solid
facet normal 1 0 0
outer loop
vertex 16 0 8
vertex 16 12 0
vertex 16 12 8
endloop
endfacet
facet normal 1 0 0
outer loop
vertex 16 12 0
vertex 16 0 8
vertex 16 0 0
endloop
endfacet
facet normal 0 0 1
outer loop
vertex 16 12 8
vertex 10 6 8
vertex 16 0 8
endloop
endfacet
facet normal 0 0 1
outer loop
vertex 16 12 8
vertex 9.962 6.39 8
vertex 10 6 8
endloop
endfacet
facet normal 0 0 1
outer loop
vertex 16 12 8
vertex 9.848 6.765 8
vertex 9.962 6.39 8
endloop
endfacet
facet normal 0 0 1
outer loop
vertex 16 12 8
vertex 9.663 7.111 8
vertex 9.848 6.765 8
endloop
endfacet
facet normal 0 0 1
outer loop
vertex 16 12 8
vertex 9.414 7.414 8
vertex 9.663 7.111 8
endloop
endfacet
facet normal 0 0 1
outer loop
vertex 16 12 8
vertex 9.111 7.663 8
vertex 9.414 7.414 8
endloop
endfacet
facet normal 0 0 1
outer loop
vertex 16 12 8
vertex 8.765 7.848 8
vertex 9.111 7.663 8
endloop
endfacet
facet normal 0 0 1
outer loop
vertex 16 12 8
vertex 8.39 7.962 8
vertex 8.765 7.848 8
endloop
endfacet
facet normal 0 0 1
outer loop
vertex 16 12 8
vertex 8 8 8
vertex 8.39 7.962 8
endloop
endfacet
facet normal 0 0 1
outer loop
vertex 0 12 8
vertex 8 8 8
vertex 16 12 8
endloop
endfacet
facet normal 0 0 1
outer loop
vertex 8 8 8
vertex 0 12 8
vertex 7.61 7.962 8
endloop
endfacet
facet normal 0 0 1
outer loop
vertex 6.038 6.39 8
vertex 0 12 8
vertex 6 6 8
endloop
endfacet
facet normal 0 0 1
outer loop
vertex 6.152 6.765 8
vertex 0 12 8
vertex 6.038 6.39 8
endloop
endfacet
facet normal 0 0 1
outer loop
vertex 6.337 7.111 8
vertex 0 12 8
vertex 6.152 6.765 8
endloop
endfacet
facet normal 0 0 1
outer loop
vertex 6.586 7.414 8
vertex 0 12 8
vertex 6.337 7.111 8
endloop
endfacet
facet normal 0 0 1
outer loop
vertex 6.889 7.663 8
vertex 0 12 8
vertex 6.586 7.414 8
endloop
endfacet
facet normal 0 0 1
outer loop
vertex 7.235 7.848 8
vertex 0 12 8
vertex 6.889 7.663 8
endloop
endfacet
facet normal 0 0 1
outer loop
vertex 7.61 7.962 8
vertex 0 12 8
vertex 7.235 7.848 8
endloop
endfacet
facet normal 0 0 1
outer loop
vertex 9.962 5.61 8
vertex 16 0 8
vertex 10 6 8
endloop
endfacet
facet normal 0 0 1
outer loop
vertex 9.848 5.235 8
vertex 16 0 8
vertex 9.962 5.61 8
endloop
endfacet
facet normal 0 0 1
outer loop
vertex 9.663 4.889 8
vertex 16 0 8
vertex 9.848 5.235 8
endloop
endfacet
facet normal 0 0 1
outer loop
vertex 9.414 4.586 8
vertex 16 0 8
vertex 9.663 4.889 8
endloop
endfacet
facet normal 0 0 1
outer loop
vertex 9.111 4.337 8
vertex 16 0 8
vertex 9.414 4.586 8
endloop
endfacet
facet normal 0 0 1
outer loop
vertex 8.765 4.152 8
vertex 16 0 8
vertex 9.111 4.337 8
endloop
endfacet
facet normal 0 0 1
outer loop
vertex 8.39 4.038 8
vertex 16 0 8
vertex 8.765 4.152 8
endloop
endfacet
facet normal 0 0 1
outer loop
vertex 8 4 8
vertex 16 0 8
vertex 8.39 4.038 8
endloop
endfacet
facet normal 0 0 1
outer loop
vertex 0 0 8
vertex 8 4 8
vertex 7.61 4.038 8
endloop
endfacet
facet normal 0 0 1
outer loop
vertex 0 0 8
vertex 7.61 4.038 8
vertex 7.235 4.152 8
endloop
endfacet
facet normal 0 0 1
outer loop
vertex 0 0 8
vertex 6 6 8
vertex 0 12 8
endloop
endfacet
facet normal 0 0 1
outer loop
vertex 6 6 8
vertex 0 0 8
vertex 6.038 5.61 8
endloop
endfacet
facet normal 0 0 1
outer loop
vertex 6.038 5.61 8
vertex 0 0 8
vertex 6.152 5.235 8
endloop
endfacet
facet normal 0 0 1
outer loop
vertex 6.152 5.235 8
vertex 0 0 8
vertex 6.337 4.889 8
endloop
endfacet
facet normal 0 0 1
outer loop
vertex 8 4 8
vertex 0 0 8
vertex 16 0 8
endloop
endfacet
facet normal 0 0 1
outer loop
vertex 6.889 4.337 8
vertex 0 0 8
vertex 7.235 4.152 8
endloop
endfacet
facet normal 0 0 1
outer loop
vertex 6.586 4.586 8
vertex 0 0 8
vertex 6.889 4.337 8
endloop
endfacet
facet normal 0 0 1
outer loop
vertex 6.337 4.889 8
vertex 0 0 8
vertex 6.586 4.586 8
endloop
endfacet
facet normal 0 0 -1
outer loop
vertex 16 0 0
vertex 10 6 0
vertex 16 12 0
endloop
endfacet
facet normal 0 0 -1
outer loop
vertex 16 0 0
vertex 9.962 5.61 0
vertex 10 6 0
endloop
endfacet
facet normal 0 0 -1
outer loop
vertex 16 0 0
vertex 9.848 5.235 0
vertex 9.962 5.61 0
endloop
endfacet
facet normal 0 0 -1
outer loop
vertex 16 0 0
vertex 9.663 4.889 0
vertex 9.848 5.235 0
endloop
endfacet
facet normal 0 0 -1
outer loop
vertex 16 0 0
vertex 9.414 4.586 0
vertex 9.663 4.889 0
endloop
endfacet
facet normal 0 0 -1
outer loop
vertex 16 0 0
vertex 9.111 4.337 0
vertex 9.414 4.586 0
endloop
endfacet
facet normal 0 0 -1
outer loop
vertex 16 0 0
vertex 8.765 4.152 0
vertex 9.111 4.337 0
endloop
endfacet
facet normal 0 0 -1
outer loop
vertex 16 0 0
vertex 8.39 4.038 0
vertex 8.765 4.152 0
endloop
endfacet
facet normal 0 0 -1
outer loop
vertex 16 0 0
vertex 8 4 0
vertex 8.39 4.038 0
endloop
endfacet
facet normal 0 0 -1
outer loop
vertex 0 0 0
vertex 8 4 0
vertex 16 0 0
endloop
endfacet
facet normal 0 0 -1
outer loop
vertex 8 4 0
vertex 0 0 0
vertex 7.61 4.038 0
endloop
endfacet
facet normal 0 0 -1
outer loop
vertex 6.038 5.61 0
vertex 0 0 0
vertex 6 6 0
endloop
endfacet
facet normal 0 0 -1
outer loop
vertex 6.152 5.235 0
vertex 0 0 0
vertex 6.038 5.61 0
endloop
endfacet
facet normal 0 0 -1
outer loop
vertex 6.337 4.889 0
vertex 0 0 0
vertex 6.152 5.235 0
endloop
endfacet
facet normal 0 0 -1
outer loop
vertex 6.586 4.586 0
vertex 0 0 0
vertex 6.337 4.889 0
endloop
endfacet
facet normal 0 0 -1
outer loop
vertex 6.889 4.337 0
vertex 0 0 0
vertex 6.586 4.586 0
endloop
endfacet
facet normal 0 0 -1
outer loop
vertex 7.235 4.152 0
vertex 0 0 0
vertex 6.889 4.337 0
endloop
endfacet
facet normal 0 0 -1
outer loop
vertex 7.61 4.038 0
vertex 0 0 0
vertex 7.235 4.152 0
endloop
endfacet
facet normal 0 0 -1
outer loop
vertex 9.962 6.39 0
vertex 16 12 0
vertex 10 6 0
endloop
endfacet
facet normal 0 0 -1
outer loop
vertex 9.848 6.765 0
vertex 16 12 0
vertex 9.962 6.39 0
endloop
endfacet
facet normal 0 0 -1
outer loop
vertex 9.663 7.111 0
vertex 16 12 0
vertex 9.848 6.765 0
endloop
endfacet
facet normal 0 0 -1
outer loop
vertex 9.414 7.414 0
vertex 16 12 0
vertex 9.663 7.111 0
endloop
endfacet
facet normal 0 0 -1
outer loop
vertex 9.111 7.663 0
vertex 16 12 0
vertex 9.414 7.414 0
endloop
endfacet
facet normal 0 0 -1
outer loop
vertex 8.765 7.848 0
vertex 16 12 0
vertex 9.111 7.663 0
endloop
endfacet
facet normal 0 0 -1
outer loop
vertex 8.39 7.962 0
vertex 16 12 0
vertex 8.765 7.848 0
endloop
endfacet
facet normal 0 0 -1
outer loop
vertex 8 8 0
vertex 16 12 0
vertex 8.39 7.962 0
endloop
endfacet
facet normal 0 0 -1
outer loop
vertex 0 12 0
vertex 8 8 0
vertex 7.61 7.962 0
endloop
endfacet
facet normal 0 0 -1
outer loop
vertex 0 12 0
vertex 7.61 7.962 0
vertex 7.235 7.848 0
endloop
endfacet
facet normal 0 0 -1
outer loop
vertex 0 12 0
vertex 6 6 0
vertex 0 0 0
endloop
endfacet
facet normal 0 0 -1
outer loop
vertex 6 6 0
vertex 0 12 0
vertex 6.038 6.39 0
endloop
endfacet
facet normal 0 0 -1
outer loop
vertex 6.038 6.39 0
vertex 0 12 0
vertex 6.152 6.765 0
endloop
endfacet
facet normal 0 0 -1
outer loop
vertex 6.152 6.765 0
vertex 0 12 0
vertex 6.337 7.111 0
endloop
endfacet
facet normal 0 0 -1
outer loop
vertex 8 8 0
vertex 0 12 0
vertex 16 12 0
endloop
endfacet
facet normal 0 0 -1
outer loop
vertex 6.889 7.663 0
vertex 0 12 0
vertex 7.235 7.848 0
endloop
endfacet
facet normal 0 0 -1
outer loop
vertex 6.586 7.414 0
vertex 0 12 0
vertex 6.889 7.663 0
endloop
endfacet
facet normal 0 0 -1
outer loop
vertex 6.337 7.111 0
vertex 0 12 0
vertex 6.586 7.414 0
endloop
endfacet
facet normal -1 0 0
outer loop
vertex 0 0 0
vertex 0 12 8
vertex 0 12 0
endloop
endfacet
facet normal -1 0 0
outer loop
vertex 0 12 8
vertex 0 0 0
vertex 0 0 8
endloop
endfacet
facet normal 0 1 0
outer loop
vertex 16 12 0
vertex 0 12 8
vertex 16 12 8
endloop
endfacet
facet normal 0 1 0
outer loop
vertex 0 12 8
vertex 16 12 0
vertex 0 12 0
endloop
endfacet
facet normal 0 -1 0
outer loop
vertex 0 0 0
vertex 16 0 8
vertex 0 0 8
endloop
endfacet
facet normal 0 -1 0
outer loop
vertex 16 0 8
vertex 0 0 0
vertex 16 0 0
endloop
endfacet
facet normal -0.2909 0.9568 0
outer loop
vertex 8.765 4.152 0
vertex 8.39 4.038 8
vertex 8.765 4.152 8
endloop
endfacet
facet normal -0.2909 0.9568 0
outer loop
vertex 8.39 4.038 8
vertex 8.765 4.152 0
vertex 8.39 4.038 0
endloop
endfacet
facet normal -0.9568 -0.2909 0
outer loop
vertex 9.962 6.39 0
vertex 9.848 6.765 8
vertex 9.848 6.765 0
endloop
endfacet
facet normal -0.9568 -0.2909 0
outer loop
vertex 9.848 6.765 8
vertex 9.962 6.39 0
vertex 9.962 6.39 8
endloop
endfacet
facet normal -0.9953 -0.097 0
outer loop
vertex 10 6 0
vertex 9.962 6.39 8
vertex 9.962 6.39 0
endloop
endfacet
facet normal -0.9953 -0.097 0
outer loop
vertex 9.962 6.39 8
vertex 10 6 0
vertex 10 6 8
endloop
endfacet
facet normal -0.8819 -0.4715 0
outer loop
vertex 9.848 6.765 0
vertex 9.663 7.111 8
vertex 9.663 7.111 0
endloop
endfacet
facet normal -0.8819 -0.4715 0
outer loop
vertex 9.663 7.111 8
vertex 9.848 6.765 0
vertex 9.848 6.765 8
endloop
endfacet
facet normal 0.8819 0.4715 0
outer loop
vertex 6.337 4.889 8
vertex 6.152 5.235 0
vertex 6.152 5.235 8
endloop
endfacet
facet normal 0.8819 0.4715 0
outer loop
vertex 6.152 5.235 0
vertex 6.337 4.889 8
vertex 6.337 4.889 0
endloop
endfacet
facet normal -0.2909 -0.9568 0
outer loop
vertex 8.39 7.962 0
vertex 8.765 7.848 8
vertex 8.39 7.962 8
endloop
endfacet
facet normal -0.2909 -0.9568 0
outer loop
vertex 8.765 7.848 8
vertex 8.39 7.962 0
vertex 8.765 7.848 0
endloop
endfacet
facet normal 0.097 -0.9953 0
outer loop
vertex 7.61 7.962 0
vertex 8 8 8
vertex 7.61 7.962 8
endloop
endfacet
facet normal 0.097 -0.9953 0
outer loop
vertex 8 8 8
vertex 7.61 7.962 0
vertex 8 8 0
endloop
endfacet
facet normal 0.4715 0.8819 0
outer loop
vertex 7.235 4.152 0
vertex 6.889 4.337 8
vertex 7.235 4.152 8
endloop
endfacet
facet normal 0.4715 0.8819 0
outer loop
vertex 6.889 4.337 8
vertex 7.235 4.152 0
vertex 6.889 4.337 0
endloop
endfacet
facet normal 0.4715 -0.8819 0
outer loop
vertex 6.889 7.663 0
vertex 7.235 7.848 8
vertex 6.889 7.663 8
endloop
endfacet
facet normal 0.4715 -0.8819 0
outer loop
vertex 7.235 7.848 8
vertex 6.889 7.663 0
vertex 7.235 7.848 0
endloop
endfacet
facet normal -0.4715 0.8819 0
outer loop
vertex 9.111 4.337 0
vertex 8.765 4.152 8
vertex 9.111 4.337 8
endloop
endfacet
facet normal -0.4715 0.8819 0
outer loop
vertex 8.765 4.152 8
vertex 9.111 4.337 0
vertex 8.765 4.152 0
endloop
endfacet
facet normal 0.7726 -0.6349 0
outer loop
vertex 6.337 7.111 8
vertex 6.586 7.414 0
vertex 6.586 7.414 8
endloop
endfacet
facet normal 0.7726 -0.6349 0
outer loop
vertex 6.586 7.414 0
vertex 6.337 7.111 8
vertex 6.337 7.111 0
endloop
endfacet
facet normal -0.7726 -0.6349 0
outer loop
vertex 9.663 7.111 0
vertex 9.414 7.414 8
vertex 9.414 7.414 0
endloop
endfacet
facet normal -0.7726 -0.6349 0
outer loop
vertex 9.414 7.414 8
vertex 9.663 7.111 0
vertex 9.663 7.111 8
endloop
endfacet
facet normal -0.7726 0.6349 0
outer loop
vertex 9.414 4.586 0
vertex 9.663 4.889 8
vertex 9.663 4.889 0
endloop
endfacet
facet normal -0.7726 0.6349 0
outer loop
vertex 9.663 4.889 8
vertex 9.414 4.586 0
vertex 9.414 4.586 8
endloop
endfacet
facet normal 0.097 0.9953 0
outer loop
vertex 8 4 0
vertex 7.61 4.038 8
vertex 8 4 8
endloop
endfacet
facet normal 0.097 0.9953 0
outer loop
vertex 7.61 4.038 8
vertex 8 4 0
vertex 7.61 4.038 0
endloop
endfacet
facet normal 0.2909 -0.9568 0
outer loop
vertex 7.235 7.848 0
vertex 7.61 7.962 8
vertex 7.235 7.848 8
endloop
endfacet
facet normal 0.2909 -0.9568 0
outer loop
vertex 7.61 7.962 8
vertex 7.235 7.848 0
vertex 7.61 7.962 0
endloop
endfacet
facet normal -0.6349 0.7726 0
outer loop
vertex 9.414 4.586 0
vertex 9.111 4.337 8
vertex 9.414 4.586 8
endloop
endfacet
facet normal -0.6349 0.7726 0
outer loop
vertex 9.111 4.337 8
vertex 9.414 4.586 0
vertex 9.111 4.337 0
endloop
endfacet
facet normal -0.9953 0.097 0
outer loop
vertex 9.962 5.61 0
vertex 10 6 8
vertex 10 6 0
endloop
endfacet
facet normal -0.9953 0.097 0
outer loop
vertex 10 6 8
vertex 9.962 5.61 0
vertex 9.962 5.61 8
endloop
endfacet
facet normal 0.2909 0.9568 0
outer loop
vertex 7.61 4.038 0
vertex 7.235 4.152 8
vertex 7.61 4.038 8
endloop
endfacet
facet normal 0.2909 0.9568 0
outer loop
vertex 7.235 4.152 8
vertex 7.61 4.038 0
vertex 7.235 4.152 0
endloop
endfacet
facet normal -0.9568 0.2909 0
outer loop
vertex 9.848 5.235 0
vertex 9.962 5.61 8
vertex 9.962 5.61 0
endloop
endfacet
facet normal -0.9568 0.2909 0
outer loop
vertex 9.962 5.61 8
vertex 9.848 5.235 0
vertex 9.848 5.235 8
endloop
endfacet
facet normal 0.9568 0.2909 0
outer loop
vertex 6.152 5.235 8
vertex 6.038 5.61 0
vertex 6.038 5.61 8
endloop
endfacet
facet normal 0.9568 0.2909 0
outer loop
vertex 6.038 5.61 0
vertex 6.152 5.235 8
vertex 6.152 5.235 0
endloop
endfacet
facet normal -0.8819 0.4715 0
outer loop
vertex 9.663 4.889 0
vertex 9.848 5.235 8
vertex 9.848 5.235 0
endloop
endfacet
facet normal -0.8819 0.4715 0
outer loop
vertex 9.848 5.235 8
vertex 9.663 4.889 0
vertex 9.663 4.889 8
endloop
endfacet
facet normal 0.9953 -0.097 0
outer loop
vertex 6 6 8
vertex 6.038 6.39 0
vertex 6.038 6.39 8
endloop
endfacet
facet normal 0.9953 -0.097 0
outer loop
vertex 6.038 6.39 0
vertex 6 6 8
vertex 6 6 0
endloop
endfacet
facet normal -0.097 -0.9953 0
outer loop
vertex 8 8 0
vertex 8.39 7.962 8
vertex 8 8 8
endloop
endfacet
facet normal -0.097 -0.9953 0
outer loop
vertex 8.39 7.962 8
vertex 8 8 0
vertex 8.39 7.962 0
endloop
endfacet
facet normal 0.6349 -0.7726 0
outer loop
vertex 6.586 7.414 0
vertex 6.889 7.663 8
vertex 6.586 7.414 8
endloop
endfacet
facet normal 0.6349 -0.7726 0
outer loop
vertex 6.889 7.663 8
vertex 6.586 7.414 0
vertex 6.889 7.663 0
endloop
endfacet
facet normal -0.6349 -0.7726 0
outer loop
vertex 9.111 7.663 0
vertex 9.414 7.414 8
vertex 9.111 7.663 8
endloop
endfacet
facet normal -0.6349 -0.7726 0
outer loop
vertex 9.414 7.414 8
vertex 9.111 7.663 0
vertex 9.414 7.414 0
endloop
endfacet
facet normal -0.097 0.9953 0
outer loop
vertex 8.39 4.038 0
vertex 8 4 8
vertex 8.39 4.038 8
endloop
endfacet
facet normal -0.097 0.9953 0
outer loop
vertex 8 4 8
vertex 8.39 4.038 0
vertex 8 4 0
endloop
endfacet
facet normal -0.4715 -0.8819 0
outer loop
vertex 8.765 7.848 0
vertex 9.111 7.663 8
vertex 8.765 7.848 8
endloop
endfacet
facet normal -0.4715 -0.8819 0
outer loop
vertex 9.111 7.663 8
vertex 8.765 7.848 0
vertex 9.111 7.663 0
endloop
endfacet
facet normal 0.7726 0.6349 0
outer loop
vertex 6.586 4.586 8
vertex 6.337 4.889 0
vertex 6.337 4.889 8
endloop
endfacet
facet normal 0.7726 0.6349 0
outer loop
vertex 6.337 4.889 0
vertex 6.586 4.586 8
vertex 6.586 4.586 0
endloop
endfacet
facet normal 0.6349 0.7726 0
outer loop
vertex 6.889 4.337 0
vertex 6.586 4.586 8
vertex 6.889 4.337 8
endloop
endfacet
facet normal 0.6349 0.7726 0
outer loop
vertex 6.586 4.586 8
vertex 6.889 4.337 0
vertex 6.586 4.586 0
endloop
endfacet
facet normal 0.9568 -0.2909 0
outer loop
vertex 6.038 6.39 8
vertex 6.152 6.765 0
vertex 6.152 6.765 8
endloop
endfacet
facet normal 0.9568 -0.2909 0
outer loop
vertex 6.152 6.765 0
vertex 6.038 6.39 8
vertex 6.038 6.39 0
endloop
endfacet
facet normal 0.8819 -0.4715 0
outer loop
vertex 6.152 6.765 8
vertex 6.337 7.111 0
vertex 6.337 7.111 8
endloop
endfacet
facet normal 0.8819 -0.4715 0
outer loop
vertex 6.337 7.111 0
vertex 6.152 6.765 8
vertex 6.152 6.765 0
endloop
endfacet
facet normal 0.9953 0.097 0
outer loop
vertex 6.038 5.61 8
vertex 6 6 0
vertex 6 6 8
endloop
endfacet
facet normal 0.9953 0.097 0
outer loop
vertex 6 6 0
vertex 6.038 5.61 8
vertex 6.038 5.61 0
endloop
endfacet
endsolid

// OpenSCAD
$fn = 32;

// ----------------------------------------------------------------------
// Micro pad: drilled pad, 5-20 mm class
// ----------------------------------------------------------------------

// --- parameters (mm) ---
pad_l = 16;               // pad length, X
pad_w = 12;               // pad width, Y
pad_t = 8;                // pad thickness, Z
hole_d = 4;               // through hole diameter

difference() {
  cube([pad_l, pad_w, pad_t]);
  translate([pad_l / 2, pad_w / 2, -1])
    cylinder(h = pad_t + 2, d = hole_d);
}
